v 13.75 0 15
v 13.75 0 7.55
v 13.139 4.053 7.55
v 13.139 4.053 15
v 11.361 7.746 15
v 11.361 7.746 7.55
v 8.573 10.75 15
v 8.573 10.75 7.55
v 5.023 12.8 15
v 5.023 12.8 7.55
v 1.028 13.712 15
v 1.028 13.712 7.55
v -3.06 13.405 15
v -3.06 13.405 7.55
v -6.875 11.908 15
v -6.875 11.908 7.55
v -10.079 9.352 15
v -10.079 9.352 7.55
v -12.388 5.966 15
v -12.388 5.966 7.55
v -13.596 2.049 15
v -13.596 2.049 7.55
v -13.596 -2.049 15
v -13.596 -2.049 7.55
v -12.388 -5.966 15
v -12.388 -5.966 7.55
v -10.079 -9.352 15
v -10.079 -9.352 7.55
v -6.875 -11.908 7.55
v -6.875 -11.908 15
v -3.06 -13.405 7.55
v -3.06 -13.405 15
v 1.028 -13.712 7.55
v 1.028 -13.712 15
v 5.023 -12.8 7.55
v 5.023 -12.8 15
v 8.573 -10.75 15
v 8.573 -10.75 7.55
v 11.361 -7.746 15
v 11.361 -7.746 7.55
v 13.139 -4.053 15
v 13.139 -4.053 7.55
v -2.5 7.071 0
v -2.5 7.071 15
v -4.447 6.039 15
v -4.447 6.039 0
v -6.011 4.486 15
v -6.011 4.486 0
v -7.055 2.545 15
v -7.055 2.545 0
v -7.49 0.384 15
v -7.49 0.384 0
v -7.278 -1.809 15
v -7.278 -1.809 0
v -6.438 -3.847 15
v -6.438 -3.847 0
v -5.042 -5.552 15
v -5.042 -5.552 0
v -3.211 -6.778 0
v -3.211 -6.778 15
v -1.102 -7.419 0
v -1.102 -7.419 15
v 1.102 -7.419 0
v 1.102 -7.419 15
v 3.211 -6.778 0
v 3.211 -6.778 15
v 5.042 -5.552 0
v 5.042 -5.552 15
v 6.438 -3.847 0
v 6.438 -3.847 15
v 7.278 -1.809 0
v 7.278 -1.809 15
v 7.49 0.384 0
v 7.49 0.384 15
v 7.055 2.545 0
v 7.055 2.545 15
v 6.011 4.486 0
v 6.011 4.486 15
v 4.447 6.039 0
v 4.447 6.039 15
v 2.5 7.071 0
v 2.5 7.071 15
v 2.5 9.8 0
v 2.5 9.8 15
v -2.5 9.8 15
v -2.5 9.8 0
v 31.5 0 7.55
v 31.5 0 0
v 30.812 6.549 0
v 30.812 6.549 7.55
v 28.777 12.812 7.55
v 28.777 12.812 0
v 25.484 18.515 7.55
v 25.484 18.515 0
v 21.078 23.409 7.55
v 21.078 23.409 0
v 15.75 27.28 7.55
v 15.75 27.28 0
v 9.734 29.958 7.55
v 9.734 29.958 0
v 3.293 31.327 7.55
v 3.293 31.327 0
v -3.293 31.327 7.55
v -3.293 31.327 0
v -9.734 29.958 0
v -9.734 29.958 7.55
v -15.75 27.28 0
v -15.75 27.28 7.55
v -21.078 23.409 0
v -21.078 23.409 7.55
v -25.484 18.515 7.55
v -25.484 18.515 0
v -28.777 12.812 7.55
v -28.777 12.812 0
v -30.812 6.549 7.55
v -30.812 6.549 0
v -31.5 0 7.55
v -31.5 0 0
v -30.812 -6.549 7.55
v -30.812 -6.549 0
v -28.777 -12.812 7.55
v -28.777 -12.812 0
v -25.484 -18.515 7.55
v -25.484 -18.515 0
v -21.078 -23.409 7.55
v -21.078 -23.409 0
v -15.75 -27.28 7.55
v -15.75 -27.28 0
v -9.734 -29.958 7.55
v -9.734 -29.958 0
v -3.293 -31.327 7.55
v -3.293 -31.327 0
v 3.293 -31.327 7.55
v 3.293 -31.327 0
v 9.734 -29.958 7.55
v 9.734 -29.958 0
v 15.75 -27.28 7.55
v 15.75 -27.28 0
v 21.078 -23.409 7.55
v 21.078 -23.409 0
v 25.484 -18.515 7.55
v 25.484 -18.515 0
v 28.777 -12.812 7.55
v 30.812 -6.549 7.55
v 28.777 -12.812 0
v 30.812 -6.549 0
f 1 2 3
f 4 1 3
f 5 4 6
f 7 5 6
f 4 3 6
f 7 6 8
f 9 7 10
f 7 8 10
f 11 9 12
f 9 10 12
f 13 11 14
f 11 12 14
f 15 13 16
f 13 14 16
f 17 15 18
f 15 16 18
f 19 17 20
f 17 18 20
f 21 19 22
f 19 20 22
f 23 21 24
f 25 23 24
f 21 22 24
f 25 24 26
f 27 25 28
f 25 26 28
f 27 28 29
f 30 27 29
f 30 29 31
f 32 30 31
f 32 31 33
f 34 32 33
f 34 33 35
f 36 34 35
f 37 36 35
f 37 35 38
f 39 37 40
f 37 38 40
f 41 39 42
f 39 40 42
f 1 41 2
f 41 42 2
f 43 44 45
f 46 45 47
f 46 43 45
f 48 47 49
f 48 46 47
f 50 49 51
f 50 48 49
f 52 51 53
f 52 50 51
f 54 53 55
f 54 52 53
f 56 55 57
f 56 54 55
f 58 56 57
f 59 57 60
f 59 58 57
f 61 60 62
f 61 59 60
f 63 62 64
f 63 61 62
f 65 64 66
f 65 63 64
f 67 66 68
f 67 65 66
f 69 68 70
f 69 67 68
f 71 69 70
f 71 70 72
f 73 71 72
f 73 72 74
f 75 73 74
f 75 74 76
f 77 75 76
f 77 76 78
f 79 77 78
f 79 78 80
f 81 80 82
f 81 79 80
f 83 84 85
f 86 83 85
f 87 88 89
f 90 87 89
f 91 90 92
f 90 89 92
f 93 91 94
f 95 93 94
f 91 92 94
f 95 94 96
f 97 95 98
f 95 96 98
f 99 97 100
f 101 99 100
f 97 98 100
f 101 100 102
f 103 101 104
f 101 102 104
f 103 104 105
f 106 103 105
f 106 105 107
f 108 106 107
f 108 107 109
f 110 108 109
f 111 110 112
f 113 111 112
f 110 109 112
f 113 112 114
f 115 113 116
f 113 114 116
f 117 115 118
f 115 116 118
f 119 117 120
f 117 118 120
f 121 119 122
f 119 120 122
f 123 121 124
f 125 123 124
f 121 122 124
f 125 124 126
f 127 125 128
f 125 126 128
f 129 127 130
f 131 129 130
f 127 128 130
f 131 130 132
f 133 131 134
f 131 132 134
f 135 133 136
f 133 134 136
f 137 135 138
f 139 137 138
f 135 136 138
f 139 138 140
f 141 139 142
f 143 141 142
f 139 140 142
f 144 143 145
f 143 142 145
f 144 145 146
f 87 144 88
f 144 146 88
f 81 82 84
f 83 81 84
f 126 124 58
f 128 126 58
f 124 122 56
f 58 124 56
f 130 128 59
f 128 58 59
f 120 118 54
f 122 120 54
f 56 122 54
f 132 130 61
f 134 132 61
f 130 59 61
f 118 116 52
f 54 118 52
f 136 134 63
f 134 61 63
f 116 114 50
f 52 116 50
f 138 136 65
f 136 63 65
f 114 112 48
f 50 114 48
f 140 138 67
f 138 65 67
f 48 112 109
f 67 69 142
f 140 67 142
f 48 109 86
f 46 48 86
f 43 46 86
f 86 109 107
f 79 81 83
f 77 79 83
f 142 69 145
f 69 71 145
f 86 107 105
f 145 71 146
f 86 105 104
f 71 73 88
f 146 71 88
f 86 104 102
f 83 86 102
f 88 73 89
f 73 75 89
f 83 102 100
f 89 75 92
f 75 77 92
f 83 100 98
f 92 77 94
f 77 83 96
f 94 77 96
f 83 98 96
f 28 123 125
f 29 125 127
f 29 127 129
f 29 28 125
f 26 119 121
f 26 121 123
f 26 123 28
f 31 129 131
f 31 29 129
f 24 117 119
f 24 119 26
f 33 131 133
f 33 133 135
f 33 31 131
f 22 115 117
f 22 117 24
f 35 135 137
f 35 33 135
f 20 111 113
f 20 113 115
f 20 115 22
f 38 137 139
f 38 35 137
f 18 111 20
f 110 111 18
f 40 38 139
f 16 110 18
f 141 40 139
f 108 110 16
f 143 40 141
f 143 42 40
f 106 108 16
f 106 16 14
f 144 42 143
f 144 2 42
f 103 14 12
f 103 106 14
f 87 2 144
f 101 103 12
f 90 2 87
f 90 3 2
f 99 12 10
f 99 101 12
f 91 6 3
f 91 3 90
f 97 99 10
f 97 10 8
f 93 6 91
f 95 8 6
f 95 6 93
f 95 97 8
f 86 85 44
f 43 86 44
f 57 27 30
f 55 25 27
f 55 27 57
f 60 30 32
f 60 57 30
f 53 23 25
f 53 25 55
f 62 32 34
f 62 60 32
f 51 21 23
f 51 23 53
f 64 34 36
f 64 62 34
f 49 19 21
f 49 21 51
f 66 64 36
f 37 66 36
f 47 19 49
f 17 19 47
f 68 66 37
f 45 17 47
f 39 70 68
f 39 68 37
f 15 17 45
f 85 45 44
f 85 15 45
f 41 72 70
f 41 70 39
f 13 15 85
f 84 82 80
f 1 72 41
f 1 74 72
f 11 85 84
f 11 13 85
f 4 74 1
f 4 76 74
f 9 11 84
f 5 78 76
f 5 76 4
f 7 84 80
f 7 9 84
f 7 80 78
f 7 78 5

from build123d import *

# Parameters (mm, degrees)
SKETCH2_R           = 31.5
SKETCH2_R_2         = 7.5
BOSS_EXTRUDE1_DEPTH = 7.55
SKETCH4_R           = 13.75
SKETCH4_R_2         = 7.5
BOSS_EXTRUDE2_DEPTH = 7.45
CUT_EXTRUDE1_DEPTH  = 48.005318848


with BuildPart() as part:
    # Sketch2 → Boss-Extrude1 (new body)
    with BuildSketch(Plane.XY):
        Circle(SKETCH2_R)
        Circle(SKETCH2_R_2, mode=Mode.SUBTRACT)
    extrude(amount=BOSS_EXTRUDE1_DEPTH)

    # Sketch4 → Boss-Extrude2 (add)
    with BuildSketch(Plane.XY.offset(7.55)):
        Circle(SKETCH4_R)
        Circle(SKETCH4_R_2, mode=Mode.SUBTRACT)
    extrude(amount=BOSS_EXTRUDE2_DEPTH)

    # Sketch5 → Cut-Extrude1 (cut, through all)
    with BuildSketch(Plane.XY.offset(15)):
        with BuildLine():
            Line((2.5, 9.8), (-2.5, 9.8))
            Line((-2.5, 9.8), (-2.5, 7.071067812))
            ThreePointArc((-2.5, 7.071067812), (0, 7.5), (2.5, 7.071067812))
            Line((2.5, 7.071067812), (2.5, 9.8))
        make_face()
    extrude(amount=-CUT_EXTRUDE1_DEPTH, mode=Mode.SUBTRACT)


solid = part.part
